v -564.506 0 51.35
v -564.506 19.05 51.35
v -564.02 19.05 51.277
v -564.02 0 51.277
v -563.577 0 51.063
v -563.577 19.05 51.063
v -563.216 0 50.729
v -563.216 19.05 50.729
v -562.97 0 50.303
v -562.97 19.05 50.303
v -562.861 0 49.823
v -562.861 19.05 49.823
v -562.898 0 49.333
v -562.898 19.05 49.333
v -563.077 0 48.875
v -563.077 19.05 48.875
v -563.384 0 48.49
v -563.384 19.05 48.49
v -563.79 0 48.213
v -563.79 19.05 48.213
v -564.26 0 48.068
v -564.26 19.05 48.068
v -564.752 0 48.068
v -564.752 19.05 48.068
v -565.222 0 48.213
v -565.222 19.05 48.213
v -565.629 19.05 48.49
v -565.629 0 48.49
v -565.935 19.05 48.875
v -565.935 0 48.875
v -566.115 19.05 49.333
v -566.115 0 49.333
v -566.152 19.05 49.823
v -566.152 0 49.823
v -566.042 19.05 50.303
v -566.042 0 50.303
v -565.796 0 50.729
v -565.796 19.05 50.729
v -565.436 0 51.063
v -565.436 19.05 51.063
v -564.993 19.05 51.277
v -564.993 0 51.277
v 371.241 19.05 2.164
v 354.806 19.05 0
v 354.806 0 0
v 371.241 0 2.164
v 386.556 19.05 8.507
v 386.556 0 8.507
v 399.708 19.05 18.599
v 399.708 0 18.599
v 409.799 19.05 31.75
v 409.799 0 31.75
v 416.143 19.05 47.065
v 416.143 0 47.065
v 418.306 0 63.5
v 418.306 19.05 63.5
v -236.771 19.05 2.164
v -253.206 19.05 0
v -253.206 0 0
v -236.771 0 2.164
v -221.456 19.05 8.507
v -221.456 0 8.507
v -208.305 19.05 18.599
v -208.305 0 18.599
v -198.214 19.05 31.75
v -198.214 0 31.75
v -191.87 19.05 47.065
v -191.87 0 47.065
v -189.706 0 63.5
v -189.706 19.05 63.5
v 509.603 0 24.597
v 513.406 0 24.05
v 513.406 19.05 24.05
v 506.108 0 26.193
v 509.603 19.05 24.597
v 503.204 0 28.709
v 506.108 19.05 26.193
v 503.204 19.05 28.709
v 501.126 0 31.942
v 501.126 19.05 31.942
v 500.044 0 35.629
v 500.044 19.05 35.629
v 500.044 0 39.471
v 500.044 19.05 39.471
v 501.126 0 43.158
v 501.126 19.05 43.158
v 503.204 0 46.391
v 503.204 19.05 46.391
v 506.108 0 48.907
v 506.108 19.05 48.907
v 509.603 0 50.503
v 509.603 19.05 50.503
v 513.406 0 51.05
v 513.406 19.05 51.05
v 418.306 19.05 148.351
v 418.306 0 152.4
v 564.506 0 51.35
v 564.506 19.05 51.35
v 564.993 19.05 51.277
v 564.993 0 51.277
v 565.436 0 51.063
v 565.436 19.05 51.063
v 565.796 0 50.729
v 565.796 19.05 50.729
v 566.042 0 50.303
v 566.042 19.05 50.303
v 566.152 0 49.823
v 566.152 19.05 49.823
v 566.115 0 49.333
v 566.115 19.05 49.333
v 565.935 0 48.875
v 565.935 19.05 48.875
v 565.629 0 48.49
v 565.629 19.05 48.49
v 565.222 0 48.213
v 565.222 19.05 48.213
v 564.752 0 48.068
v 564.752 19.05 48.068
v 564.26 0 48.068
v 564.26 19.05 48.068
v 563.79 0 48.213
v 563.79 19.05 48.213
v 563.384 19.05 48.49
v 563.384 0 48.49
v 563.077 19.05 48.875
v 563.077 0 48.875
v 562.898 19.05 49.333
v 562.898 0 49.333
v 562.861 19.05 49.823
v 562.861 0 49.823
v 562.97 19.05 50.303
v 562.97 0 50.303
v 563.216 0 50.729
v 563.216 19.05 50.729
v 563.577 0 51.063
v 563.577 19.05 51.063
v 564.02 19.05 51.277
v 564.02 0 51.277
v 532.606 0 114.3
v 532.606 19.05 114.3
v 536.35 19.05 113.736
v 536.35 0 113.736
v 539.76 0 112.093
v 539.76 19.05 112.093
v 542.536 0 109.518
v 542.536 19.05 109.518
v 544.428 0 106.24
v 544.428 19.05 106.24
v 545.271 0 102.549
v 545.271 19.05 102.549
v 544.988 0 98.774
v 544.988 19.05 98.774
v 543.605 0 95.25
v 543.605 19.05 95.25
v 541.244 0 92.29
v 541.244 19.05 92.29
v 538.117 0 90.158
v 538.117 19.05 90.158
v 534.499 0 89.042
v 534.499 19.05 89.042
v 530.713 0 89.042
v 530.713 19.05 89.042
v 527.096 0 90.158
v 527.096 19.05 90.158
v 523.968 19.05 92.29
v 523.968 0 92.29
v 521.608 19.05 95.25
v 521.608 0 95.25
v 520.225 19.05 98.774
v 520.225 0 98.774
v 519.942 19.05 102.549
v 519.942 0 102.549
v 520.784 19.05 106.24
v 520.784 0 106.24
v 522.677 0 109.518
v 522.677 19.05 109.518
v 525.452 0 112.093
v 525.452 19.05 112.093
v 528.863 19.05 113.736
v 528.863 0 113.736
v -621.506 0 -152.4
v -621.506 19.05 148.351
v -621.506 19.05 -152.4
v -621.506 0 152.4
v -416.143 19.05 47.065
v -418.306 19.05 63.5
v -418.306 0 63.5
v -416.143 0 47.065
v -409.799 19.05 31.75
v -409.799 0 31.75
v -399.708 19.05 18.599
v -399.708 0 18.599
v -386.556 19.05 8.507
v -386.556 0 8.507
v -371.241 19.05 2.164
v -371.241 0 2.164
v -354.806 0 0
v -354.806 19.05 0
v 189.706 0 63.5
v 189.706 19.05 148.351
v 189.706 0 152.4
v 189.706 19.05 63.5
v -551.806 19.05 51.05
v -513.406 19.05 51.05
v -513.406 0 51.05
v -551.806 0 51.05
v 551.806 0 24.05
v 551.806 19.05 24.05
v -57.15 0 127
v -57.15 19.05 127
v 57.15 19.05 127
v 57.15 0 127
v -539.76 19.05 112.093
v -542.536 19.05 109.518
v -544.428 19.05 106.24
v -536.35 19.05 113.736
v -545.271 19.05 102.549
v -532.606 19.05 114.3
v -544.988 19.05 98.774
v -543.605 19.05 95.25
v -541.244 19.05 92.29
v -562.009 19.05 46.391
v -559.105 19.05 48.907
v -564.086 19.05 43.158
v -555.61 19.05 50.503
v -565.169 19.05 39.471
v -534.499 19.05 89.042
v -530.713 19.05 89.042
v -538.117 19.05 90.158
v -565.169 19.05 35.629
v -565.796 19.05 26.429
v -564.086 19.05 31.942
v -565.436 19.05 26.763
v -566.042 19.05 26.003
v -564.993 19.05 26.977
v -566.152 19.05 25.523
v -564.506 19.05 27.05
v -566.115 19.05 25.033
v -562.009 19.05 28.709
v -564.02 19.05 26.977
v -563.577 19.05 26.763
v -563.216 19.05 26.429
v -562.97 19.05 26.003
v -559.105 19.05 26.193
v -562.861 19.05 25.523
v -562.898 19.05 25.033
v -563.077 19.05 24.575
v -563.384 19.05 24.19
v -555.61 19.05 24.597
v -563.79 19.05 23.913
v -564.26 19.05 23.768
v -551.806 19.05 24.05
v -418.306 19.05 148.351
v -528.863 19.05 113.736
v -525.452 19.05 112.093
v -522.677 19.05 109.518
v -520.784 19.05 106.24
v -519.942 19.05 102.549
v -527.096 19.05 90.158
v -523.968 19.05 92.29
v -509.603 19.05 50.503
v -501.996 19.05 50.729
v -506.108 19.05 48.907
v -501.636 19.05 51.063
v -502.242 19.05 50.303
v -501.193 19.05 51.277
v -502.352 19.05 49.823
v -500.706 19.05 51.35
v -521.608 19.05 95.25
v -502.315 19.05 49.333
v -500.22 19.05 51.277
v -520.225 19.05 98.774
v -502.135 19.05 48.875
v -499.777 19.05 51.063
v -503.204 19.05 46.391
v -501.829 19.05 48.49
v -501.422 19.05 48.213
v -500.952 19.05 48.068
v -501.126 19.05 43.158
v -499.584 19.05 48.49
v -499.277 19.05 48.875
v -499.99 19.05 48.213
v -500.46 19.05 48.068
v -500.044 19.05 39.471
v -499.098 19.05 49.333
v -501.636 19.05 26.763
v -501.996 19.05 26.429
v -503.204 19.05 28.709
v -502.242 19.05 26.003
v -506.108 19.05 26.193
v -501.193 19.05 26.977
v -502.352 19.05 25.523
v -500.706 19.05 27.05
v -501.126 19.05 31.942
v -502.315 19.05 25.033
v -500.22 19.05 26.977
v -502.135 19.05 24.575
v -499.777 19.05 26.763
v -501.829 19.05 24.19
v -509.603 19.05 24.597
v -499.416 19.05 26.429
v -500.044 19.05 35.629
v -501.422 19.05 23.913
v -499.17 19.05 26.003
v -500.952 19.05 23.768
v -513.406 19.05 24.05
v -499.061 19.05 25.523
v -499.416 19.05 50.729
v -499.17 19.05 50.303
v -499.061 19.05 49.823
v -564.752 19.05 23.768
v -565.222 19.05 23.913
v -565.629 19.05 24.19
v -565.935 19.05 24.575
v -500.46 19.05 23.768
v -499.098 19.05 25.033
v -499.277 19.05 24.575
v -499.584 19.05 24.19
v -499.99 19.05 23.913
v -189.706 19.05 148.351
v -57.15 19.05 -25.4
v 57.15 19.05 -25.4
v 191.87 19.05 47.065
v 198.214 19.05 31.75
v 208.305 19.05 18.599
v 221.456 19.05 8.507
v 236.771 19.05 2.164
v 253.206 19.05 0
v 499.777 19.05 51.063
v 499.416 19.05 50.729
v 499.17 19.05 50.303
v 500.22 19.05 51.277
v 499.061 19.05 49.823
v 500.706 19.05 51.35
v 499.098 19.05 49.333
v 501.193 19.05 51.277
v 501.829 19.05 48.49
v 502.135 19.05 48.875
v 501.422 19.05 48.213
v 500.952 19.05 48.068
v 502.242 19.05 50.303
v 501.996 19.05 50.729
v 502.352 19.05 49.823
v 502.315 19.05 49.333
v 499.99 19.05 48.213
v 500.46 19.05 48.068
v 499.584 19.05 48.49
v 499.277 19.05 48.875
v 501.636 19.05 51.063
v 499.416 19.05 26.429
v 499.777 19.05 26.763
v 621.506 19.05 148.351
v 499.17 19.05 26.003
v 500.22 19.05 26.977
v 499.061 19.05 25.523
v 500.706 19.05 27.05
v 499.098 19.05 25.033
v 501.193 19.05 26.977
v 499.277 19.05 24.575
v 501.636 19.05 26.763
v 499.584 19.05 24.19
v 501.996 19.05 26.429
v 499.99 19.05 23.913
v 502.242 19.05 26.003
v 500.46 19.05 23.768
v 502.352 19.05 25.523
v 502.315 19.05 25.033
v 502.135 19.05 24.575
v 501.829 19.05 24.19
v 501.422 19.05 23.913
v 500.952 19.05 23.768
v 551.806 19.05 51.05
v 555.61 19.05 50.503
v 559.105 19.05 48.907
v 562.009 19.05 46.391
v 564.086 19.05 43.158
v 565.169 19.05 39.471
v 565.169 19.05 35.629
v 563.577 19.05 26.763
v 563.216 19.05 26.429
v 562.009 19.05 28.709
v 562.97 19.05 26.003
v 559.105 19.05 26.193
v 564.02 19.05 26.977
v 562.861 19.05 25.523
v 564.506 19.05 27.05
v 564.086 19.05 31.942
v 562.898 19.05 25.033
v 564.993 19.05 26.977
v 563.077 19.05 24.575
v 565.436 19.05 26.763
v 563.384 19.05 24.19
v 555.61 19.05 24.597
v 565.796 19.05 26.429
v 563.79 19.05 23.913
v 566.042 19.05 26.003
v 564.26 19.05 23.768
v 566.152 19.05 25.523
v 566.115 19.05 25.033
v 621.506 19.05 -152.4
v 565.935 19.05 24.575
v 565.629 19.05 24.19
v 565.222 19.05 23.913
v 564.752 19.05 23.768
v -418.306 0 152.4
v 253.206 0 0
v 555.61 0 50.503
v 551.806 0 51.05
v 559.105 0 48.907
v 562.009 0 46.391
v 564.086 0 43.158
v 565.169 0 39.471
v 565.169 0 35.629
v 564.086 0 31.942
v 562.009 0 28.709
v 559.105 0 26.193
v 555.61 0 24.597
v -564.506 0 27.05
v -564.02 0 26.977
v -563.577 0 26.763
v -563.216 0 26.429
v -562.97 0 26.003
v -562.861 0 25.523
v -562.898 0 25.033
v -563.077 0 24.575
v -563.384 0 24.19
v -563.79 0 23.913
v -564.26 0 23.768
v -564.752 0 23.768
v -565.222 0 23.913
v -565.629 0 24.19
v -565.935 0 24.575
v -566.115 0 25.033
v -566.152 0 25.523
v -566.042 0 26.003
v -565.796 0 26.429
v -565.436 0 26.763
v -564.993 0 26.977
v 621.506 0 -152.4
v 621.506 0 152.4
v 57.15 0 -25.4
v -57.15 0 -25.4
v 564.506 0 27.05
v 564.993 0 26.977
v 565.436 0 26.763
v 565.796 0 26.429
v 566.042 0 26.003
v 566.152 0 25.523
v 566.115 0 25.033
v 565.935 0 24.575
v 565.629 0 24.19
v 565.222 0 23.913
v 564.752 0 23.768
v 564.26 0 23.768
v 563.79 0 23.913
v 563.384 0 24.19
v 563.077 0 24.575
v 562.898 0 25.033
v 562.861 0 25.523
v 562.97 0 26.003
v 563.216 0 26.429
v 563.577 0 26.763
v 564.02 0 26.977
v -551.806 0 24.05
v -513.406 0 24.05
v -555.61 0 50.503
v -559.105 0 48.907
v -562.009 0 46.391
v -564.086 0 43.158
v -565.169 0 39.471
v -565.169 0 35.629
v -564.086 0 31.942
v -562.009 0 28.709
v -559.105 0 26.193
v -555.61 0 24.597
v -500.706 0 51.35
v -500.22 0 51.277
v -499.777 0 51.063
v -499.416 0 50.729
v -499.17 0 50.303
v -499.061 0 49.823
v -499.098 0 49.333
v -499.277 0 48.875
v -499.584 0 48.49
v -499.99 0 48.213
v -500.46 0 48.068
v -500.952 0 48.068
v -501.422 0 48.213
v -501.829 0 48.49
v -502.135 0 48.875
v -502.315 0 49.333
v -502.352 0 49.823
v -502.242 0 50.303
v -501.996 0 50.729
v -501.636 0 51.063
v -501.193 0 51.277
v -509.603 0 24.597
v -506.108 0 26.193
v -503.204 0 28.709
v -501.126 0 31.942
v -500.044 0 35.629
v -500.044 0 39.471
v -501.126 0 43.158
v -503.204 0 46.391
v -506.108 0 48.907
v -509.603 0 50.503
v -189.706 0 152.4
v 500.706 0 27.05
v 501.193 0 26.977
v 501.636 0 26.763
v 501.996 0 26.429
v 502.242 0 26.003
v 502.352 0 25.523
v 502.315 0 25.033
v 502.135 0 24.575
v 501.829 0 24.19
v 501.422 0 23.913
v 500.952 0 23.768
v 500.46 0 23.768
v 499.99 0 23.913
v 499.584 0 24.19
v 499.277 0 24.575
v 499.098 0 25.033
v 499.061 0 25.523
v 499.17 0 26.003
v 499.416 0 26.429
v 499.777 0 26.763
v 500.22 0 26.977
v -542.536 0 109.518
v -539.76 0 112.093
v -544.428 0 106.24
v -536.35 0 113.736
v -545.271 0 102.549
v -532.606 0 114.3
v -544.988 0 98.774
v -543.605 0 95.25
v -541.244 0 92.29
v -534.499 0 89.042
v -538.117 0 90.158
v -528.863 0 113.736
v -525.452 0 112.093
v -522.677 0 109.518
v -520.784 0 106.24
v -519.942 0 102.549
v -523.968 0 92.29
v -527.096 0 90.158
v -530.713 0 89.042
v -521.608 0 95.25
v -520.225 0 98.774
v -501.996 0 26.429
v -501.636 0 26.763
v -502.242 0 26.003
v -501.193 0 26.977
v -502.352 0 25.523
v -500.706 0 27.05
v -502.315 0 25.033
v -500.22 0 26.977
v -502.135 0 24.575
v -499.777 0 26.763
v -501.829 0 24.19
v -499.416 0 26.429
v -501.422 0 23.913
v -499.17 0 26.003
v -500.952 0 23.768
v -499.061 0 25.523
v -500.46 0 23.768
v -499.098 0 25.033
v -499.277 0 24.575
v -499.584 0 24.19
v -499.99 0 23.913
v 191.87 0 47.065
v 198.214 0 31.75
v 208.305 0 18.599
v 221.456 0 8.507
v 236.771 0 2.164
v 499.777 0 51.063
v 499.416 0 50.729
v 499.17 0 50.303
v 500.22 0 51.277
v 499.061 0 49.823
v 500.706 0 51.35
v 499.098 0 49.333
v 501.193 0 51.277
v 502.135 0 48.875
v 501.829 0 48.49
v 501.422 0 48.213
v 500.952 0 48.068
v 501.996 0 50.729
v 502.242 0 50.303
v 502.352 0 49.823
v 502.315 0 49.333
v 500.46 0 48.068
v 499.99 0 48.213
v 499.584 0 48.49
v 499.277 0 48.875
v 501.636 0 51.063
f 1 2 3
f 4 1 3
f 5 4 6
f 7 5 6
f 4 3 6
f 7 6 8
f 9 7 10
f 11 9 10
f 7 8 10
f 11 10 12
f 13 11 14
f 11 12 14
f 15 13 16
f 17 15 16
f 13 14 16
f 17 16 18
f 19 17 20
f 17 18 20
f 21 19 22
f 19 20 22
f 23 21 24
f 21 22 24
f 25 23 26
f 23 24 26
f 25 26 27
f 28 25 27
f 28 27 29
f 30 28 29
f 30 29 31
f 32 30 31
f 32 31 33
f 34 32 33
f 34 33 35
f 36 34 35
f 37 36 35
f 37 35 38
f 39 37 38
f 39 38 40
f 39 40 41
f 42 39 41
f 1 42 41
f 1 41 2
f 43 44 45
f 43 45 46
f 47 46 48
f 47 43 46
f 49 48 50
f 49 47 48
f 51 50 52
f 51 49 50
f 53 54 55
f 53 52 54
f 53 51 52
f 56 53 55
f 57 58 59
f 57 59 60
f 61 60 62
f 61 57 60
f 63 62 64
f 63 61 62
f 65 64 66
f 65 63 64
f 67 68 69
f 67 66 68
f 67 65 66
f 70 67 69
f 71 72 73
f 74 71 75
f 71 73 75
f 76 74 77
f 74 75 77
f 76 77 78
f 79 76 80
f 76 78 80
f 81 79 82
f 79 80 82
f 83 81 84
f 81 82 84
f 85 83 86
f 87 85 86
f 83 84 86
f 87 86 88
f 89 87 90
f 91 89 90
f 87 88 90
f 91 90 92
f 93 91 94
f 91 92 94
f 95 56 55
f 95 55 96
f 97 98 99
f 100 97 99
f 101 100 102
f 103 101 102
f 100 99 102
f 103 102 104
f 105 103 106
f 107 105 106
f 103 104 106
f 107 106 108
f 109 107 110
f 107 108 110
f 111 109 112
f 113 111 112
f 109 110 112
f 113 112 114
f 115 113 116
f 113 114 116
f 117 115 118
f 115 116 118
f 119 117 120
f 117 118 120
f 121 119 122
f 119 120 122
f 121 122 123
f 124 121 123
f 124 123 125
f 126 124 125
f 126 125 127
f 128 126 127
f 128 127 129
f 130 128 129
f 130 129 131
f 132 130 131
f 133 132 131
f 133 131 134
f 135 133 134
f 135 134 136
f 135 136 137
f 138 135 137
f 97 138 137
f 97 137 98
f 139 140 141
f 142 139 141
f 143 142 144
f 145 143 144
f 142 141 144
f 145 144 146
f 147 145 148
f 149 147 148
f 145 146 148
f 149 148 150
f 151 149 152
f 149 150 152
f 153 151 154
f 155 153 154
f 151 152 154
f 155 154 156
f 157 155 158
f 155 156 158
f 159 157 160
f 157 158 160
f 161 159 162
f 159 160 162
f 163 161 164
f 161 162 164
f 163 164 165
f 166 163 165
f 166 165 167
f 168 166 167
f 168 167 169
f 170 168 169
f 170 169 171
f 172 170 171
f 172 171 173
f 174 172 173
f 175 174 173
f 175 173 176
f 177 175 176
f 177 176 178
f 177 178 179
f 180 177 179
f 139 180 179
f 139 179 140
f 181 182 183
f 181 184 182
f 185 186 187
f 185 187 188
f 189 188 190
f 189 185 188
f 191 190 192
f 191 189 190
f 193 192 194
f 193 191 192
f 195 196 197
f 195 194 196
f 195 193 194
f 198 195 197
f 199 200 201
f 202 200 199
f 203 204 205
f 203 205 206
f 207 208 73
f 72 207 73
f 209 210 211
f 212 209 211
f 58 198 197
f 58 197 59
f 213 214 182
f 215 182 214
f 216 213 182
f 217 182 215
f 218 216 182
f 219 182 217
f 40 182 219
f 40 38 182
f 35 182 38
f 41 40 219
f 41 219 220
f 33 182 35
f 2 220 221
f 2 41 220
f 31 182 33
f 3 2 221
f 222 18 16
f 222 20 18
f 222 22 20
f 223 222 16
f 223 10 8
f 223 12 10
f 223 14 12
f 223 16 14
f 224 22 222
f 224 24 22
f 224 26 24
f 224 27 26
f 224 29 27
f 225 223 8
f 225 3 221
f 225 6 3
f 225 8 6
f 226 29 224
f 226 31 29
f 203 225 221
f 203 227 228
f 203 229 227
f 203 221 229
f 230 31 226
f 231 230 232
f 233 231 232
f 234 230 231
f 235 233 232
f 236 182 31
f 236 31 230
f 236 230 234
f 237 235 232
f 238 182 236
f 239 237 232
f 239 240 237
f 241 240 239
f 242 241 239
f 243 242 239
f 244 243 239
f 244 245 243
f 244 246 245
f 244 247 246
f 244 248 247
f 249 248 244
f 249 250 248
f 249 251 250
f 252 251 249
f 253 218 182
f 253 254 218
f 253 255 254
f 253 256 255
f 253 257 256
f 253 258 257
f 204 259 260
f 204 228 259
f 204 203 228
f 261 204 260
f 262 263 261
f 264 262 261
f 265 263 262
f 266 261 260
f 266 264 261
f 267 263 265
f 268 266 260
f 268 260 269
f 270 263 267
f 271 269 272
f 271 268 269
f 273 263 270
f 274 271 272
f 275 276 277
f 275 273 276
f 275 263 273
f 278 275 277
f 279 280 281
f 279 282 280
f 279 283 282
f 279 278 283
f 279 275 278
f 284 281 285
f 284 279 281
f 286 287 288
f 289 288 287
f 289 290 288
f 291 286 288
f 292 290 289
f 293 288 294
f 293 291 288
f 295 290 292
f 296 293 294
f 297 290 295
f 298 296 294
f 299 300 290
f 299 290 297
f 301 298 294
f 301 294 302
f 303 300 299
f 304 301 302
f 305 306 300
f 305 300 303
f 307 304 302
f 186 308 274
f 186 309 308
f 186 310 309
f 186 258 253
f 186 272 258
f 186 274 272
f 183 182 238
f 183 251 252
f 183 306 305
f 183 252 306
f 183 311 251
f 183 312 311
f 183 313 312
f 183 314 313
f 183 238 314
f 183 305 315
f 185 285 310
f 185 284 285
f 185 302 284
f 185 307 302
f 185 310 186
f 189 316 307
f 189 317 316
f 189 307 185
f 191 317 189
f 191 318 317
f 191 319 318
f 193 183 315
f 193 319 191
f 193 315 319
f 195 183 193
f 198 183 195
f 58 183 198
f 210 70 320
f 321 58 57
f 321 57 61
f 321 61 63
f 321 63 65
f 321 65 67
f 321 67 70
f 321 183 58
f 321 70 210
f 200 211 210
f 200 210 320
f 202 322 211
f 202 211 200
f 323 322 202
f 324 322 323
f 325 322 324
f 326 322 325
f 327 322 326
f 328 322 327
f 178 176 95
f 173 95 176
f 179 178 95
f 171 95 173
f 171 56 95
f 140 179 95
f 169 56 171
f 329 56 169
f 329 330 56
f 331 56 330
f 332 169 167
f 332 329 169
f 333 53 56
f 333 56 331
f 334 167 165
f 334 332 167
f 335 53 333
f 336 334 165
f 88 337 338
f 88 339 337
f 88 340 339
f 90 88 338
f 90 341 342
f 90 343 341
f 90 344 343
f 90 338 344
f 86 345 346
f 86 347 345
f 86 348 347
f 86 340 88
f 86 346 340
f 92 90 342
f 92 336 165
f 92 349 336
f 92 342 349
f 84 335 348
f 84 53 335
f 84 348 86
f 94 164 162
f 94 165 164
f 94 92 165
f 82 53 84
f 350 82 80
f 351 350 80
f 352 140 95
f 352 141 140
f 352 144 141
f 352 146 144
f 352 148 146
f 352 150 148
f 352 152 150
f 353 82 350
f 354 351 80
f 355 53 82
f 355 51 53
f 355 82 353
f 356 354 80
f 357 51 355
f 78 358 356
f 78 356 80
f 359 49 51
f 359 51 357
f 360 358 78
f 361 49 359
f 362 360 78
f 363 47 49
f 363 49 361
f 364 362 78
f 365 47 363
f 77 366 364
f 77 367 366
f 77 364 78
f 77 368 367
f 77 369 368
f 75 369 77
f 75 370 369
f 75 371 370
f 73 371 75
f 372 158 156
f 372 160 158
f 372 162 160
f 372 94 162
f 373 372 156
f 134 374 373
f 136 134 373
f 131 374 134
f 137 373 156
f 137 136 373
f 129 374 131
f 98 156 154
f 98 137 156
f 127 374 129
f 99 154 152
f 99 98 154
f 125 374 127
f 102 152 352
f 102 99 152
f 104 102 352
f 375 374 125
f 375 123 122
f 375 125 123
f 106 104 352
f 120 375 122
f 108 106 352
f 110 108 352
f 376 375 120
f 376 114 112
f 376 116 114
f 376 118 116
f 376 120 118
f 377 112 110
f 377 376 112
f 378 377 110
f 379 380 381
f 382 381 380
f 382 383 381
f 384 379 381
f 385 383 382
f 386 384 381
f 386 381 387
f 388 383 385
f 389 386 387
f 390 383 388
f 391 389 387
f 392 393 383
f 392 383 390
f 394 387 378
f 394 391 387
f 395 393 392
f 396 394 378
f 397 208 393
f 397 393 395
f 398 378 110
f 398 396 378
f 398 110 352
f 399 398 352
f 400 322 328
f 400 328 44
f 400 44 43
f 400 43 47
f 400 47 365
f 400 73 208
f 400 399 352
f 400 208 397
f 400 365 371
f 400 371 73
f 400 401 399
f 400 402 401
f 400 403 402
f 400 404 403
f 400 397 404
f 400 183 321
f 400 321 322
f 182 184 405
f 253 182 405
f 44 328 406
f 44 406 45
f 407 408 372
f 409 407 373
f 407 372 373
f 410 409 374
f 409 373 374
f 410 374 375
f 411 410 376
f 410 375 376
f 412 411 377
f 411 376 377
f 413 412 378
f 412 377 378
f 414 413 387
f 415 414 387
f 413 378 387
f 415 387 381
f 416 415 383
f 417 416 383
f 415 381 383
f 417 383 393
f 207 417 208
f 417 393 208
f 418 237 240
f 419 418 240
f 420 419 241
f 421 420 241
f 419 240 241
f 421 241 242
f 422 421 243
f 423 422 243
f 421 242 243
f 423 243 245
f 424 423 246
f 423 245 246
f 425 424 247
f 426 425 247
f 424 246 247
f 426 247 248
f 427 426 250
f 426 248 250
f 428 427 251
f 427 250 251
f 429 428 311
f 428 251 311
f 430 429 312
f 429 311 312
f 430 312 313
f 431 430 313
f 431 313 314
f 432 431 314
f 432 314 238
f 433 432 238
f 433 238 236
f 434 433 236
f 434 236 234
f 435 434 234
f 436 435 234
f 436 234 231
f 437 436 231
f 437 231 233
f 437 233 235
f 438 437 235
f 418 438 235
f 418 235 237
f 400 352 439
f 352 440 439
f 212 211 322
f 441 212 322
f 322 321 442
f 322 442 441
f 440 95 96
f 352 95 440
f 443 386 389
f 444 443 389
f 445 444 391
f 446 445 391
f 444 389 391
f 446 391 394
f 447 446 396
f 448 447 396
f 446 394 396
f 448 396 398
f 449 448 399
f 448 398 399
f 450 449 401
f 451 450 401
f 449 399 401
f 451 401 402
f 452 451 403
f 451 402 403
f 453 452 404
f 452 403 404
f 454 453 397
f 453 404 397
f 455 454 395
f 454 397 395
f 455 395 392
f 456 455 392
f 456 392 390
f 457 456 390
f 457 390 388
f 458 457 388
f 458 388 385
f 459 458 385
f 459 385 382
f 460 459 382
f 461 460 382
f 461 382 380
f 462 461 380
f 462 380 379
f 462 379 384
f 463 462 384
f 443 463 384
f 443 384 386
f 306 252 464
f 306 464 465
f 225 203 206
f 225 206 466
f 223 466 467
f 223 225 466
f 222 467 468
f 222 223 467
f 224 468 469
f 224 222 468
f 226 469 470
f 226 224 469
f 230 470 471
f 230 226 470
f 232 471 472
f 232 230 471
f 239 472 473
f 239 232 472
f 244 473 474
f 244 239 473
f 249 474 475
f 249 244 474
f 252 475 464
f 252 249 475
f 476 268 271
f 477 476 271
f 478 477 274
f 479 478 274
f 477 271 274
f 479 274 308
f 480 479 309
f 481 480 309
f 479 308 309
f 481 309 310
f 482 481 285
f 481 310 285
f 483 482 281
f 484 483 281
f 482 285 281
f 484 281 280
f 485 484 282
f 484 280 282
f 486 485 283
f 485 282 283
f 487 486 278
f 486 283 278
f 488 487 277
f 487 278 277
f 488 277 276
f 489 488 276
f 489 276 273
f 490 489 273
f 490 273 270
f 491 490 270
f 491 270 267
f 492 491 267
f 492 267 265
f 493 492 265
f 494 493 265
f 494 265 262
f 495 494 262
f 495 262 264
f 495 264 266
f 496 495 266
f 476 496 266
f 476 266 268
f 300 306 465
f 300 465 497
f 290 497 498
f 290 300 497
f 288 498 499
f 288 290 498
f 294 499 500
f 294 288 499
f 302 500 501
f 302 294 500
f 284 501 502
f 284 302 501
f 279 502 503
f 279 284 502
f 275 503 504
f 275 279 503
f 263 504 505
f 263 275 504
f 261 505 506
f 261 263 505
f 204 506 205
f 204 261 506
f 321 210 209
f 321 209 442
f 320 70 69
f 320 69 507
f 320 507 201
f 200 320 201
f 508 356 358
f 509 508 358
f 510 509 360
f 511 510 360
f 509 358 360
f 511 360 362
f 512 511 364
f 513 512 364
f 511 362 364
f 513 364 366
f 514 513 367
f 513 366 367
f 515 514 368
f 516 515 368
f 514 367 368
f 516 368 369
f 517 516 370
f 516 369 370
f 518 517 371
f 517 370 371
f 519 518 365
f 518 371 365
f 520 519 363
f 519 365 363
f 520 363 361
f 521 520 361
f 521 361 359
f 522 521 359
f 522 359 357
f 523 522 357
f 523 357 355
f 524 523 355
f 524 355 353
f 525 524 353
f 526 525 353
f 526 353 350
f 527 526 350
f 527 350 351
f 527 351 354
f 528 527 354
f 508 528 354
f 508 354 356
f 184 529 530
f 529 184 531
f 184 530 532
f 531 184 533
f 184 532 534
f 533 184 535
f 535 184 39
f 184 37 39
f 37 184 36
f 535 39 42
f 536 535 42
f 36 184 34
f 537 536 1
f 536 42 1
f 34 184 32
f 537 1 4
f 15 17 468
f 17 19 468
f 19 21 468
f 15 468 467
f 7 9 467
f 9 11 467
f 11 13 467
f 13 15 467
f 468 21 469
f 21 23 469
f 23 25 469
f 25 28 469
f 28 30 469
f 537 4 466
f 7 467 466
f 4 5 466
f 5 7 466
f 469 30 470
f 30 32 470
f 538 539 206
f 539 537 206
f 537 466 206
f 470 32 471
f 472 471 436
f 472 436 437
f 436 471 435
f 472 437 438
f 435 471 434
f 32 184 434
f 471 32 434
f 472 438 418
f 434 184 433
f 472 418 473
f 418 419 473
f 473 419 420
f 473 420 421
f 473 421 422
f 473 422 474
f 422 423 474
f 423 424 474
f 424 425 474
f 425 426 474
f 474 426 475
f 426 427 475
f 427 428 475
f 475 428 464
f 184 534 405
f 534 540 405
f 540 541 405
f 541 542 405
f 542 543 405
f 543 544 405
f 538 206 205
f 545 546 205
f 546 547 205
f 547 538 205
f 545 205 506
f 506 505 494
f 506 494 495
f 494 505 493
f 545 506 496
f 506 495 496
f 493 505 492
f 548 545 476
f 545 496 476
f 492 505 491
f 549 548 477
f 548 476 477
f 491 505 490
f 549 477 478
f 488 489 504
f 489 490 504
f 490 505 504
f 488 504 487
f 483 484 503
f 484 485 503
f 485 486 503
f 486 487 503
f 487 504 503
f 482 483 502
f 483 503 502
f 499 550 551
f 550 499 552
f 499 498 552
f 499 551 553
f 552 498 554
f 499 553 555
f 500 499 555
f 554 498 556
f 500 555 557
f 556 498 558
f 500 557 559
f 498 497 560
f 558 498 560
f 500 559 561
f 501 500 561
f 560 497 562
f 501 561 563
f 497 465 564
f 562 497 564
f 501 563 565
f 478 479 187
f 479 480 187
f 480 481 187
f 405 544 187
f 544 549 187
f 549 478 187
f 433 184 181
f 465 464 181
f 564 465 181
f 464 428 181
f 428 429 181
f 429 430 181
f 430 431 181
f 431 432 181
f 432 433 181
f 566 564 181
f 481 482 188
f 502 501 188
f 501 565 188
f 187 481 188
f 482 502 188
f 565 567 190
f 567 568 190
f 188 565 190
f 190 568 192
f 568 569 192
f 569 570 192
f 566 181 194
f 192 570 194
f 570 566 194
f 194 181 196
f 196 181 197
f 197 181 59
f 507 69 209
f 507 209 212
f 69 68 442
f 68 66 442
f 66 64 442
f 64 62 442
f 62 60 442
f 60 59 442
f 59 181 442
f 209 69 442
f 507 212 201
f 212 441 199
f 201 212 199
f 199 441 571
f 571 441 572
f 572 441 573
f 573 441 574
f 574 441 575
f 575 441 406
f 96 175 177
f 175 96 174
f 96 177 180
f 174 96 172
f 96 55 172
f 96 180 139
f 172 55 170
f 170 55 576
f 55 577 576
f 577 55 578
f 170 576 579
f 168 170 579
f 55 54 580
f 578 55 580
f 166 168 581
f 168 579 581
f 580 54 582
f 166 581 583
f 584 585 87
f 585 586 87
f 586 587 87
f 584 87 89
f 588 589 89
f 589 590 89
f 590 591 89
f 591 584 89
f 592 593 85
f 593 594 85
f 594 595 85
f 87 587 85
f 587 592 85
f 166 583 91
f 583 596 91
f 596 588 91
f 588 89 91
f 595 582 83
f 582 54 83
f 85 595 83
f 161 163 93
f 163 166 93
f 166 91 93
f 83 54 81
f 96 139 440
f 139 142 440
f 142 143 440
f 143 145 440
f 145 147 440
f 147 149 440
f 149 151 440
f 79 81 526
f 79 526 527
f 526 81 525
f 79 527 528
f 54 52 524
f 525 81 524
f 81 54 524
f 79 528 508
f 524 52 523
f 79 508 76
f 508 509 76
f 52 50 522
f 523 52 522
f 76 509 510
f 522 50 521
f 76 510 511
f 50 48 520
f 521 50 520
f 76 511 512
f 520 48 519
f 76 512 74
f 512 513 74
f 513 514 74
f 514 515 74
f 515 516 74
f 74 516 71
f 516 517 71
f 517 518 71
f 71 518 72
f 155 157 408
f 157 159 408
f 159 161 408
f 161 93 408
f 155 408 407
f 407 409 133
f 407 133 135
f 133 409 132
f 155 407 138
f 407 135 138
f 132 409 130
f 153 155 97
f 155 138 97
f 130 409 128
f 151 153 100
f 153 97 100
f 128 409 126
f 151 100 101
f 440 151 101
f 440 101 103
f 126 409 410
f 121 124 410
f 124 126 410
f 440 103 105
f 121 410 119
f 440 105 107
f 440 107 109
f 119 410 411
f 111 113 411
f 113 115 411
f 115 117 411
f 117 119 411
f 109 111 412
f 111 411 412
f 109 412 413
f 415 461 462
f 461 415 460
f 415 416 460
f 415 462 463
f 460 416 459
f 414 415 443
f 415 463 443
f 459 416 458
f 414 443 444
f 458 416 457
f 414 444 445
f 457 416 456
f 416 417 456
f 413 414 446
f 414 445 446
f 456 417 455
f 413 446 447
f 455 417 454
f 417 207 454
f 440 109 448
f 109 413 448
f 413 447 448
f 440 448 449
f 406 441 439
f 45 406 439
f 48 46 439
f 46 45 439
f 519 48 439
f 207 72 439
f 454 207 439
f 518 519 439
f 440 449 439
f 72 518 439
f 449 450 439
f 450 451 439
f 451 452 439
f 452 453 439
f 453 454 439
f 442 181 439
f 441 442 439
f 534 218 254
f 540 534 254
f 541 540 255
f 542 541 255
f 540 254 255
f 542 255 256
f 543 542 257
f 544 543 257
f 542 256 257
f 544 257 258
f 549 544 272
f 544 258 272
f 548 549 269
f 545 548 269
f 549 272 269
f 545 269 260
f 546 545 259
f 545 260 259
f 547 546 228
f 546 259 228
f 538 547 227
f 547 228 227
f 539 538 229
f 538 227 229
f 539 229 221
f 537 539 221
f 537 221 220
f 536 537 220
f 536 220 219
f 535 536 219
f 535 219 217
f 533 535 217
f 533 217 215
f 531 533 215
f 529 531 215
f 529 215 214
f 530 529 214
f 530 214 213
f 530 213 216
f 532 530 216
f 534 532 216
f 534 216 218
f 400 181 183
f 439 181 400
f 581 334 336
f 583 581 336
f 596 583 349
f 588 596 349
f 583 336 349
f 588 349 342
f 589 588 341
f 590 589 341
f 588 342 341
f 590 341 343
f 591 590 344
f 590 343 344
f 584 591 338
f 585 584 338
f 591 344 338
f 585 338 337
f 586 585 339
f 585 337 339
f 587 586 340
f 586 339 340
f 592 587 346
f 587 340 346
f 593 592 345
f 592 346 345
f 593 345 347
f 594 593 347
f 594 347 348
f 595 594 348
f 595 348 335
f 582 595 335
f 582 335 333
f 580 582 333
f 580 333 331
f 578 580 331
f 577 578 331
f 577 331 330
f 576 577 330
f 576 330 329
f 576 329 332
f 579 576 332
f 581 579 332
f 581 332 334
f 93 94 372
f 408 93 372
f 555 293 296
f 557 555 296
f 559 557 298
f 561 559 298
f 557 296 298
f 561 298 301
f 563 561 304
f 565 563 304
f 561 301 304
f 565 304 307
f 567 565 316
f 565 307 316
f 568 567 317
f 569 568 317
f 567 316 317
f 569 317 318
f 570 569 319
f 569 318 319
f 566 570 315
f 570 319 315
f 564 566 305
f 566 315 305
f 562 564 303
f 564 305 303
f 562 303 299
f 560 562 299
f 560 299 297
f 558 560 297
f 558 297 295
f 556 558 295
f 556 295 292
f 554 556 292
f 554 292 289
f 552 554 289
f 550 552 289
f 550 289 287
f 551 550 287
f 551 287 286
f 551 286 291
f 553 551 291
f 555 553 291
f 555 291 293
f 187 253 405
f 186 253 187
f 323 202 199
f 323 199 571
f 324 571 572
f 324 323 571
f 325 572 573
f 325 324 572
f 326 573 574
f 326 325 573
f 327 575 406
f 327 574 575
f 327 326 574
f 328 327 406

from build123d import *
from OCP.BRepFilletAPI import BRepFilletAPI_MakeChamfer

# Parameters (mm, degrees)
SKETCH1_W           = 1243.0125
SKETCH1_H           = 304.8
BOSS_EXTRUDE1_DEPTH = 19.05
CUT_EXTRUDE2_DEPTH  = 641.202062859
SKETCH5_W           = 114.3
SKETCH5_H           = 152.4
CUT_EXTRUDE3_DEPTH  = 641.202062859
SKETCH6_R           = 12.7
CUT_EXTRUDE4_DEPTH  = 641.202062859
CHAMFER1_SIZE       = 19.05
CHAMFER1_SIZE_2     = 4.0492025
SKETCH8_R           = 1.65
CUT_EXTRUDE5_DEPTH  = 641.202062859


with BuildPart() as part:
    # Sketch1 → Boss-Extrude1 (new body)
    with BuildSketch(Plane(origin=(0, 0, 0), x_dir=(1, 0, 0), z_dir=(0, 1, 0))):
        Rectangle(SKETCH1_W, SKETCH1_H)
    extrude(amount=BOSS_EXTRUDE1_DEPTH)

    # Sketch4 → Cut-Extrude2 (cut, through all)
    with BuildSketch(Plane(origin=(0, 19.05, 0), x_dir=(1, 0, 0), z_dir=(0, 1, 0))):
        with BuildLine():
            Line((-418.30625, -152.4), (-418.30625, -63.5))
            ThreePointArc((-418.30625, -63.5), (-399.707530605, -18.598719395), (-354.80625, 0))
            Line((-354.80625, 0), (-253.20625, 0))
            ThreePointArc((-253.20625, 0), (-208.304969395, -18.598719395), (-189.70625, -63.5))
            Line((-189.70625, -63.5), (-189.70625, -152.4))
            Line((-189.70625, -152.4), (-418.30625, -152.4))
        make_face()
        with BuildLine():
            Line((189.70625, -152.4), (189.70625, -63.5))
            ThreePointArc((189.70625, -63.5), (208.304969395, -18.598719395), (253.20625, 0))
            Line((253.20625, 0), (354.80625, 0))
            ThreePointArc((354.80625, 0), (399.707530605, -18.598719395), (418.30625, -63.5))
            Line((418.30625, -63.5), (418.30625, -152.4))
            Line((418.30625, -152.4), (189.70625, -152.4))
        make_face()
    extrude(amount=-CUT_EXTRUDE2_DEPTH, mode=Mode.SUBTRACT)

    # Sketch5 → Cut-Extrude3 (cut, through all)
    with BuildSketch(Plane(origin=(0, 19.05, 0), x_dir=(1, 0, 0), z_dir=(0, 1, 0))):
        with Locations((0, -50.8)):
            Rectangle(SKETCH5_W, SKETCH5_H)
    extrude(amount=-CUT_EXTRUDE3_DEPTH, mode=Mode.SUBTRACT)

    # Sketch6 → Cut-Extrude4 (cut, through all)
    with BuildSketch(Plane(origin=(0, 19.05, 0), x_dir=(1, 0, 0), z_dir=(0, 1, 0))):
        with Locations(Location((-532.60625, -101.6, 0), (0, 0, 270))):
            Circle(SKETCH6_R)
        with Locations(Location((532.60625, -101.6, 0), (0, 0, 270))):
            Circle(SKETCH6_R)
    extrude(amount=-CUT_EXTRUDE4_DEPTH, mode=Mode.SUBTRACT)

    # Chamfer1
    chamfer1_edges_1 = [part.edges().sort_by_distance(p)[0] for p in [
        (519.90625, 19.05, 152.4),
    ]]
    chamfer1_side_1 = [part.faces().sort_by_distance(p)[0] for p in [
        (519.90625, 18.96901595, 152.4),
    ]]
    chamfer1_edges_2 = [part.edges().sort_by_distance(p)[0] for p in [
        (0, 19.05, 152.4),
    ]]
    chamfer1_side_2 = [part.faces().sort_by_distance(p)[0] for p in [
        (0, 19.05, 152.31901595),
    ]]
    chamfer1_edges_3 = [part.edges().sort_by_distance(p)[0] for p in [
        (-519.90625, 19.05, 152.4),
    ]]
    chamfer1_side_3 = [part.faces().sort_by_distance(p)[0] for p in [
        (-519.90625, 19.05, 152.31901595),
    ]]
    chamfer1 = BRepFilletAPI_MakeChamfer(part.part.solid().wrapped)
    for e in chamfer1_edges_1:
        chamfer1.Add(CHAMFER1_SIZE - 0.0001, CHAMFER1_SIZE_2 - 0.0001, e.wrapped, chamfer1_side_1[0].wrapped)
    for e in chamfer1_edges_2:
        chamfer1.Add(CHAMFER1_SIZE_2 - 0.0001, CHAMFER1_SIZE - 0.0001, e.wrapped, chamfer1_side_2[0].wrapped)
    for e in chamfer1_edges_3:
        chamfer1.Add(CHAMFER1_SIZE_2 - 0.0001, CHAMFER1_SIZE - 0.0001, e.wrapped, chamfer1_side_3[0].wrapped)
    add(Compound.cast(chamfer1.Shape()), mode=Mode.REPLACE)  # a hair under: the kernel refuses the full size

    # Sketch8 → Cut-Extrude5 (cut, through all)
    with BuildSketch(Plane(origin=(0, 19.05, 0), x_dir=(1, 0, 0), z_dir=(0, 1, 0))):
        with Locations(Location((-564.50625, -25.4, 0), (0, 0, 270))):
            Circle(SKETCH8_R)
        with Locations(Location((-564.50625, -49.7, 0), (0, 0, 270))):
            Circle(SKETCH8_R)
        with Locations(Location((-500.70625, -49.7, 0), (0, 0, 270))):
            Circle(SKETCH8_R)
        with Locations(Location((-500.70625, -25.4, 0), (0, 0, 270))):
            Circle(SKETCH8_R)
        with Locations(Location((500.70625, -25.4, 0), (0, 0, 270))):
            Circle(SKETCH8_R)
        with Locations(Location((500.70625, -49.7, 0), (0, 0, 270))):
            Circle(SKETCH8_R)
        with Locations(Location((564.50625, -49.7, 0), (0, 0, 270))):
            Circle(SKETCH8_R)
        with Locations(Location((564.50625, -25.4, 0), (0, 0, 270))):
            Circle(SKETCH8_R)
        with BuildLine():
            Line((-513.40625, -51.05), (-551.80625, -51.05))
            ThreePointArc((-551.80625, -51.05), (-565.30625, -37.55), (-551.80625, -24.05))
            Line((-551.80625, -24.05), (-513.40625, -24.05))
            ThreePointArc((-513.40625, -24.05), (-499.90625, -37.55), (-513.40625, -51.05))
        make_face()
        with BuildLine():
            Line((513.40625, -51.05), (551.80625, -51.05))
            ThreePointArc((551.80625, -51.05), (565.30625, -37.55), (551.80625, -24.05))
            Line((551.80625, -24.05), (513.40625, -24.05))
            ThreePointArc((513.40625, -24.05), (499.90625, -37.55), (513.40625, -51.05))
        make_face()
    extrude(amount=-CUT_EXTRUDE5_DEPTH, mode=Mode.SUBTRACT)


solid = part.part
